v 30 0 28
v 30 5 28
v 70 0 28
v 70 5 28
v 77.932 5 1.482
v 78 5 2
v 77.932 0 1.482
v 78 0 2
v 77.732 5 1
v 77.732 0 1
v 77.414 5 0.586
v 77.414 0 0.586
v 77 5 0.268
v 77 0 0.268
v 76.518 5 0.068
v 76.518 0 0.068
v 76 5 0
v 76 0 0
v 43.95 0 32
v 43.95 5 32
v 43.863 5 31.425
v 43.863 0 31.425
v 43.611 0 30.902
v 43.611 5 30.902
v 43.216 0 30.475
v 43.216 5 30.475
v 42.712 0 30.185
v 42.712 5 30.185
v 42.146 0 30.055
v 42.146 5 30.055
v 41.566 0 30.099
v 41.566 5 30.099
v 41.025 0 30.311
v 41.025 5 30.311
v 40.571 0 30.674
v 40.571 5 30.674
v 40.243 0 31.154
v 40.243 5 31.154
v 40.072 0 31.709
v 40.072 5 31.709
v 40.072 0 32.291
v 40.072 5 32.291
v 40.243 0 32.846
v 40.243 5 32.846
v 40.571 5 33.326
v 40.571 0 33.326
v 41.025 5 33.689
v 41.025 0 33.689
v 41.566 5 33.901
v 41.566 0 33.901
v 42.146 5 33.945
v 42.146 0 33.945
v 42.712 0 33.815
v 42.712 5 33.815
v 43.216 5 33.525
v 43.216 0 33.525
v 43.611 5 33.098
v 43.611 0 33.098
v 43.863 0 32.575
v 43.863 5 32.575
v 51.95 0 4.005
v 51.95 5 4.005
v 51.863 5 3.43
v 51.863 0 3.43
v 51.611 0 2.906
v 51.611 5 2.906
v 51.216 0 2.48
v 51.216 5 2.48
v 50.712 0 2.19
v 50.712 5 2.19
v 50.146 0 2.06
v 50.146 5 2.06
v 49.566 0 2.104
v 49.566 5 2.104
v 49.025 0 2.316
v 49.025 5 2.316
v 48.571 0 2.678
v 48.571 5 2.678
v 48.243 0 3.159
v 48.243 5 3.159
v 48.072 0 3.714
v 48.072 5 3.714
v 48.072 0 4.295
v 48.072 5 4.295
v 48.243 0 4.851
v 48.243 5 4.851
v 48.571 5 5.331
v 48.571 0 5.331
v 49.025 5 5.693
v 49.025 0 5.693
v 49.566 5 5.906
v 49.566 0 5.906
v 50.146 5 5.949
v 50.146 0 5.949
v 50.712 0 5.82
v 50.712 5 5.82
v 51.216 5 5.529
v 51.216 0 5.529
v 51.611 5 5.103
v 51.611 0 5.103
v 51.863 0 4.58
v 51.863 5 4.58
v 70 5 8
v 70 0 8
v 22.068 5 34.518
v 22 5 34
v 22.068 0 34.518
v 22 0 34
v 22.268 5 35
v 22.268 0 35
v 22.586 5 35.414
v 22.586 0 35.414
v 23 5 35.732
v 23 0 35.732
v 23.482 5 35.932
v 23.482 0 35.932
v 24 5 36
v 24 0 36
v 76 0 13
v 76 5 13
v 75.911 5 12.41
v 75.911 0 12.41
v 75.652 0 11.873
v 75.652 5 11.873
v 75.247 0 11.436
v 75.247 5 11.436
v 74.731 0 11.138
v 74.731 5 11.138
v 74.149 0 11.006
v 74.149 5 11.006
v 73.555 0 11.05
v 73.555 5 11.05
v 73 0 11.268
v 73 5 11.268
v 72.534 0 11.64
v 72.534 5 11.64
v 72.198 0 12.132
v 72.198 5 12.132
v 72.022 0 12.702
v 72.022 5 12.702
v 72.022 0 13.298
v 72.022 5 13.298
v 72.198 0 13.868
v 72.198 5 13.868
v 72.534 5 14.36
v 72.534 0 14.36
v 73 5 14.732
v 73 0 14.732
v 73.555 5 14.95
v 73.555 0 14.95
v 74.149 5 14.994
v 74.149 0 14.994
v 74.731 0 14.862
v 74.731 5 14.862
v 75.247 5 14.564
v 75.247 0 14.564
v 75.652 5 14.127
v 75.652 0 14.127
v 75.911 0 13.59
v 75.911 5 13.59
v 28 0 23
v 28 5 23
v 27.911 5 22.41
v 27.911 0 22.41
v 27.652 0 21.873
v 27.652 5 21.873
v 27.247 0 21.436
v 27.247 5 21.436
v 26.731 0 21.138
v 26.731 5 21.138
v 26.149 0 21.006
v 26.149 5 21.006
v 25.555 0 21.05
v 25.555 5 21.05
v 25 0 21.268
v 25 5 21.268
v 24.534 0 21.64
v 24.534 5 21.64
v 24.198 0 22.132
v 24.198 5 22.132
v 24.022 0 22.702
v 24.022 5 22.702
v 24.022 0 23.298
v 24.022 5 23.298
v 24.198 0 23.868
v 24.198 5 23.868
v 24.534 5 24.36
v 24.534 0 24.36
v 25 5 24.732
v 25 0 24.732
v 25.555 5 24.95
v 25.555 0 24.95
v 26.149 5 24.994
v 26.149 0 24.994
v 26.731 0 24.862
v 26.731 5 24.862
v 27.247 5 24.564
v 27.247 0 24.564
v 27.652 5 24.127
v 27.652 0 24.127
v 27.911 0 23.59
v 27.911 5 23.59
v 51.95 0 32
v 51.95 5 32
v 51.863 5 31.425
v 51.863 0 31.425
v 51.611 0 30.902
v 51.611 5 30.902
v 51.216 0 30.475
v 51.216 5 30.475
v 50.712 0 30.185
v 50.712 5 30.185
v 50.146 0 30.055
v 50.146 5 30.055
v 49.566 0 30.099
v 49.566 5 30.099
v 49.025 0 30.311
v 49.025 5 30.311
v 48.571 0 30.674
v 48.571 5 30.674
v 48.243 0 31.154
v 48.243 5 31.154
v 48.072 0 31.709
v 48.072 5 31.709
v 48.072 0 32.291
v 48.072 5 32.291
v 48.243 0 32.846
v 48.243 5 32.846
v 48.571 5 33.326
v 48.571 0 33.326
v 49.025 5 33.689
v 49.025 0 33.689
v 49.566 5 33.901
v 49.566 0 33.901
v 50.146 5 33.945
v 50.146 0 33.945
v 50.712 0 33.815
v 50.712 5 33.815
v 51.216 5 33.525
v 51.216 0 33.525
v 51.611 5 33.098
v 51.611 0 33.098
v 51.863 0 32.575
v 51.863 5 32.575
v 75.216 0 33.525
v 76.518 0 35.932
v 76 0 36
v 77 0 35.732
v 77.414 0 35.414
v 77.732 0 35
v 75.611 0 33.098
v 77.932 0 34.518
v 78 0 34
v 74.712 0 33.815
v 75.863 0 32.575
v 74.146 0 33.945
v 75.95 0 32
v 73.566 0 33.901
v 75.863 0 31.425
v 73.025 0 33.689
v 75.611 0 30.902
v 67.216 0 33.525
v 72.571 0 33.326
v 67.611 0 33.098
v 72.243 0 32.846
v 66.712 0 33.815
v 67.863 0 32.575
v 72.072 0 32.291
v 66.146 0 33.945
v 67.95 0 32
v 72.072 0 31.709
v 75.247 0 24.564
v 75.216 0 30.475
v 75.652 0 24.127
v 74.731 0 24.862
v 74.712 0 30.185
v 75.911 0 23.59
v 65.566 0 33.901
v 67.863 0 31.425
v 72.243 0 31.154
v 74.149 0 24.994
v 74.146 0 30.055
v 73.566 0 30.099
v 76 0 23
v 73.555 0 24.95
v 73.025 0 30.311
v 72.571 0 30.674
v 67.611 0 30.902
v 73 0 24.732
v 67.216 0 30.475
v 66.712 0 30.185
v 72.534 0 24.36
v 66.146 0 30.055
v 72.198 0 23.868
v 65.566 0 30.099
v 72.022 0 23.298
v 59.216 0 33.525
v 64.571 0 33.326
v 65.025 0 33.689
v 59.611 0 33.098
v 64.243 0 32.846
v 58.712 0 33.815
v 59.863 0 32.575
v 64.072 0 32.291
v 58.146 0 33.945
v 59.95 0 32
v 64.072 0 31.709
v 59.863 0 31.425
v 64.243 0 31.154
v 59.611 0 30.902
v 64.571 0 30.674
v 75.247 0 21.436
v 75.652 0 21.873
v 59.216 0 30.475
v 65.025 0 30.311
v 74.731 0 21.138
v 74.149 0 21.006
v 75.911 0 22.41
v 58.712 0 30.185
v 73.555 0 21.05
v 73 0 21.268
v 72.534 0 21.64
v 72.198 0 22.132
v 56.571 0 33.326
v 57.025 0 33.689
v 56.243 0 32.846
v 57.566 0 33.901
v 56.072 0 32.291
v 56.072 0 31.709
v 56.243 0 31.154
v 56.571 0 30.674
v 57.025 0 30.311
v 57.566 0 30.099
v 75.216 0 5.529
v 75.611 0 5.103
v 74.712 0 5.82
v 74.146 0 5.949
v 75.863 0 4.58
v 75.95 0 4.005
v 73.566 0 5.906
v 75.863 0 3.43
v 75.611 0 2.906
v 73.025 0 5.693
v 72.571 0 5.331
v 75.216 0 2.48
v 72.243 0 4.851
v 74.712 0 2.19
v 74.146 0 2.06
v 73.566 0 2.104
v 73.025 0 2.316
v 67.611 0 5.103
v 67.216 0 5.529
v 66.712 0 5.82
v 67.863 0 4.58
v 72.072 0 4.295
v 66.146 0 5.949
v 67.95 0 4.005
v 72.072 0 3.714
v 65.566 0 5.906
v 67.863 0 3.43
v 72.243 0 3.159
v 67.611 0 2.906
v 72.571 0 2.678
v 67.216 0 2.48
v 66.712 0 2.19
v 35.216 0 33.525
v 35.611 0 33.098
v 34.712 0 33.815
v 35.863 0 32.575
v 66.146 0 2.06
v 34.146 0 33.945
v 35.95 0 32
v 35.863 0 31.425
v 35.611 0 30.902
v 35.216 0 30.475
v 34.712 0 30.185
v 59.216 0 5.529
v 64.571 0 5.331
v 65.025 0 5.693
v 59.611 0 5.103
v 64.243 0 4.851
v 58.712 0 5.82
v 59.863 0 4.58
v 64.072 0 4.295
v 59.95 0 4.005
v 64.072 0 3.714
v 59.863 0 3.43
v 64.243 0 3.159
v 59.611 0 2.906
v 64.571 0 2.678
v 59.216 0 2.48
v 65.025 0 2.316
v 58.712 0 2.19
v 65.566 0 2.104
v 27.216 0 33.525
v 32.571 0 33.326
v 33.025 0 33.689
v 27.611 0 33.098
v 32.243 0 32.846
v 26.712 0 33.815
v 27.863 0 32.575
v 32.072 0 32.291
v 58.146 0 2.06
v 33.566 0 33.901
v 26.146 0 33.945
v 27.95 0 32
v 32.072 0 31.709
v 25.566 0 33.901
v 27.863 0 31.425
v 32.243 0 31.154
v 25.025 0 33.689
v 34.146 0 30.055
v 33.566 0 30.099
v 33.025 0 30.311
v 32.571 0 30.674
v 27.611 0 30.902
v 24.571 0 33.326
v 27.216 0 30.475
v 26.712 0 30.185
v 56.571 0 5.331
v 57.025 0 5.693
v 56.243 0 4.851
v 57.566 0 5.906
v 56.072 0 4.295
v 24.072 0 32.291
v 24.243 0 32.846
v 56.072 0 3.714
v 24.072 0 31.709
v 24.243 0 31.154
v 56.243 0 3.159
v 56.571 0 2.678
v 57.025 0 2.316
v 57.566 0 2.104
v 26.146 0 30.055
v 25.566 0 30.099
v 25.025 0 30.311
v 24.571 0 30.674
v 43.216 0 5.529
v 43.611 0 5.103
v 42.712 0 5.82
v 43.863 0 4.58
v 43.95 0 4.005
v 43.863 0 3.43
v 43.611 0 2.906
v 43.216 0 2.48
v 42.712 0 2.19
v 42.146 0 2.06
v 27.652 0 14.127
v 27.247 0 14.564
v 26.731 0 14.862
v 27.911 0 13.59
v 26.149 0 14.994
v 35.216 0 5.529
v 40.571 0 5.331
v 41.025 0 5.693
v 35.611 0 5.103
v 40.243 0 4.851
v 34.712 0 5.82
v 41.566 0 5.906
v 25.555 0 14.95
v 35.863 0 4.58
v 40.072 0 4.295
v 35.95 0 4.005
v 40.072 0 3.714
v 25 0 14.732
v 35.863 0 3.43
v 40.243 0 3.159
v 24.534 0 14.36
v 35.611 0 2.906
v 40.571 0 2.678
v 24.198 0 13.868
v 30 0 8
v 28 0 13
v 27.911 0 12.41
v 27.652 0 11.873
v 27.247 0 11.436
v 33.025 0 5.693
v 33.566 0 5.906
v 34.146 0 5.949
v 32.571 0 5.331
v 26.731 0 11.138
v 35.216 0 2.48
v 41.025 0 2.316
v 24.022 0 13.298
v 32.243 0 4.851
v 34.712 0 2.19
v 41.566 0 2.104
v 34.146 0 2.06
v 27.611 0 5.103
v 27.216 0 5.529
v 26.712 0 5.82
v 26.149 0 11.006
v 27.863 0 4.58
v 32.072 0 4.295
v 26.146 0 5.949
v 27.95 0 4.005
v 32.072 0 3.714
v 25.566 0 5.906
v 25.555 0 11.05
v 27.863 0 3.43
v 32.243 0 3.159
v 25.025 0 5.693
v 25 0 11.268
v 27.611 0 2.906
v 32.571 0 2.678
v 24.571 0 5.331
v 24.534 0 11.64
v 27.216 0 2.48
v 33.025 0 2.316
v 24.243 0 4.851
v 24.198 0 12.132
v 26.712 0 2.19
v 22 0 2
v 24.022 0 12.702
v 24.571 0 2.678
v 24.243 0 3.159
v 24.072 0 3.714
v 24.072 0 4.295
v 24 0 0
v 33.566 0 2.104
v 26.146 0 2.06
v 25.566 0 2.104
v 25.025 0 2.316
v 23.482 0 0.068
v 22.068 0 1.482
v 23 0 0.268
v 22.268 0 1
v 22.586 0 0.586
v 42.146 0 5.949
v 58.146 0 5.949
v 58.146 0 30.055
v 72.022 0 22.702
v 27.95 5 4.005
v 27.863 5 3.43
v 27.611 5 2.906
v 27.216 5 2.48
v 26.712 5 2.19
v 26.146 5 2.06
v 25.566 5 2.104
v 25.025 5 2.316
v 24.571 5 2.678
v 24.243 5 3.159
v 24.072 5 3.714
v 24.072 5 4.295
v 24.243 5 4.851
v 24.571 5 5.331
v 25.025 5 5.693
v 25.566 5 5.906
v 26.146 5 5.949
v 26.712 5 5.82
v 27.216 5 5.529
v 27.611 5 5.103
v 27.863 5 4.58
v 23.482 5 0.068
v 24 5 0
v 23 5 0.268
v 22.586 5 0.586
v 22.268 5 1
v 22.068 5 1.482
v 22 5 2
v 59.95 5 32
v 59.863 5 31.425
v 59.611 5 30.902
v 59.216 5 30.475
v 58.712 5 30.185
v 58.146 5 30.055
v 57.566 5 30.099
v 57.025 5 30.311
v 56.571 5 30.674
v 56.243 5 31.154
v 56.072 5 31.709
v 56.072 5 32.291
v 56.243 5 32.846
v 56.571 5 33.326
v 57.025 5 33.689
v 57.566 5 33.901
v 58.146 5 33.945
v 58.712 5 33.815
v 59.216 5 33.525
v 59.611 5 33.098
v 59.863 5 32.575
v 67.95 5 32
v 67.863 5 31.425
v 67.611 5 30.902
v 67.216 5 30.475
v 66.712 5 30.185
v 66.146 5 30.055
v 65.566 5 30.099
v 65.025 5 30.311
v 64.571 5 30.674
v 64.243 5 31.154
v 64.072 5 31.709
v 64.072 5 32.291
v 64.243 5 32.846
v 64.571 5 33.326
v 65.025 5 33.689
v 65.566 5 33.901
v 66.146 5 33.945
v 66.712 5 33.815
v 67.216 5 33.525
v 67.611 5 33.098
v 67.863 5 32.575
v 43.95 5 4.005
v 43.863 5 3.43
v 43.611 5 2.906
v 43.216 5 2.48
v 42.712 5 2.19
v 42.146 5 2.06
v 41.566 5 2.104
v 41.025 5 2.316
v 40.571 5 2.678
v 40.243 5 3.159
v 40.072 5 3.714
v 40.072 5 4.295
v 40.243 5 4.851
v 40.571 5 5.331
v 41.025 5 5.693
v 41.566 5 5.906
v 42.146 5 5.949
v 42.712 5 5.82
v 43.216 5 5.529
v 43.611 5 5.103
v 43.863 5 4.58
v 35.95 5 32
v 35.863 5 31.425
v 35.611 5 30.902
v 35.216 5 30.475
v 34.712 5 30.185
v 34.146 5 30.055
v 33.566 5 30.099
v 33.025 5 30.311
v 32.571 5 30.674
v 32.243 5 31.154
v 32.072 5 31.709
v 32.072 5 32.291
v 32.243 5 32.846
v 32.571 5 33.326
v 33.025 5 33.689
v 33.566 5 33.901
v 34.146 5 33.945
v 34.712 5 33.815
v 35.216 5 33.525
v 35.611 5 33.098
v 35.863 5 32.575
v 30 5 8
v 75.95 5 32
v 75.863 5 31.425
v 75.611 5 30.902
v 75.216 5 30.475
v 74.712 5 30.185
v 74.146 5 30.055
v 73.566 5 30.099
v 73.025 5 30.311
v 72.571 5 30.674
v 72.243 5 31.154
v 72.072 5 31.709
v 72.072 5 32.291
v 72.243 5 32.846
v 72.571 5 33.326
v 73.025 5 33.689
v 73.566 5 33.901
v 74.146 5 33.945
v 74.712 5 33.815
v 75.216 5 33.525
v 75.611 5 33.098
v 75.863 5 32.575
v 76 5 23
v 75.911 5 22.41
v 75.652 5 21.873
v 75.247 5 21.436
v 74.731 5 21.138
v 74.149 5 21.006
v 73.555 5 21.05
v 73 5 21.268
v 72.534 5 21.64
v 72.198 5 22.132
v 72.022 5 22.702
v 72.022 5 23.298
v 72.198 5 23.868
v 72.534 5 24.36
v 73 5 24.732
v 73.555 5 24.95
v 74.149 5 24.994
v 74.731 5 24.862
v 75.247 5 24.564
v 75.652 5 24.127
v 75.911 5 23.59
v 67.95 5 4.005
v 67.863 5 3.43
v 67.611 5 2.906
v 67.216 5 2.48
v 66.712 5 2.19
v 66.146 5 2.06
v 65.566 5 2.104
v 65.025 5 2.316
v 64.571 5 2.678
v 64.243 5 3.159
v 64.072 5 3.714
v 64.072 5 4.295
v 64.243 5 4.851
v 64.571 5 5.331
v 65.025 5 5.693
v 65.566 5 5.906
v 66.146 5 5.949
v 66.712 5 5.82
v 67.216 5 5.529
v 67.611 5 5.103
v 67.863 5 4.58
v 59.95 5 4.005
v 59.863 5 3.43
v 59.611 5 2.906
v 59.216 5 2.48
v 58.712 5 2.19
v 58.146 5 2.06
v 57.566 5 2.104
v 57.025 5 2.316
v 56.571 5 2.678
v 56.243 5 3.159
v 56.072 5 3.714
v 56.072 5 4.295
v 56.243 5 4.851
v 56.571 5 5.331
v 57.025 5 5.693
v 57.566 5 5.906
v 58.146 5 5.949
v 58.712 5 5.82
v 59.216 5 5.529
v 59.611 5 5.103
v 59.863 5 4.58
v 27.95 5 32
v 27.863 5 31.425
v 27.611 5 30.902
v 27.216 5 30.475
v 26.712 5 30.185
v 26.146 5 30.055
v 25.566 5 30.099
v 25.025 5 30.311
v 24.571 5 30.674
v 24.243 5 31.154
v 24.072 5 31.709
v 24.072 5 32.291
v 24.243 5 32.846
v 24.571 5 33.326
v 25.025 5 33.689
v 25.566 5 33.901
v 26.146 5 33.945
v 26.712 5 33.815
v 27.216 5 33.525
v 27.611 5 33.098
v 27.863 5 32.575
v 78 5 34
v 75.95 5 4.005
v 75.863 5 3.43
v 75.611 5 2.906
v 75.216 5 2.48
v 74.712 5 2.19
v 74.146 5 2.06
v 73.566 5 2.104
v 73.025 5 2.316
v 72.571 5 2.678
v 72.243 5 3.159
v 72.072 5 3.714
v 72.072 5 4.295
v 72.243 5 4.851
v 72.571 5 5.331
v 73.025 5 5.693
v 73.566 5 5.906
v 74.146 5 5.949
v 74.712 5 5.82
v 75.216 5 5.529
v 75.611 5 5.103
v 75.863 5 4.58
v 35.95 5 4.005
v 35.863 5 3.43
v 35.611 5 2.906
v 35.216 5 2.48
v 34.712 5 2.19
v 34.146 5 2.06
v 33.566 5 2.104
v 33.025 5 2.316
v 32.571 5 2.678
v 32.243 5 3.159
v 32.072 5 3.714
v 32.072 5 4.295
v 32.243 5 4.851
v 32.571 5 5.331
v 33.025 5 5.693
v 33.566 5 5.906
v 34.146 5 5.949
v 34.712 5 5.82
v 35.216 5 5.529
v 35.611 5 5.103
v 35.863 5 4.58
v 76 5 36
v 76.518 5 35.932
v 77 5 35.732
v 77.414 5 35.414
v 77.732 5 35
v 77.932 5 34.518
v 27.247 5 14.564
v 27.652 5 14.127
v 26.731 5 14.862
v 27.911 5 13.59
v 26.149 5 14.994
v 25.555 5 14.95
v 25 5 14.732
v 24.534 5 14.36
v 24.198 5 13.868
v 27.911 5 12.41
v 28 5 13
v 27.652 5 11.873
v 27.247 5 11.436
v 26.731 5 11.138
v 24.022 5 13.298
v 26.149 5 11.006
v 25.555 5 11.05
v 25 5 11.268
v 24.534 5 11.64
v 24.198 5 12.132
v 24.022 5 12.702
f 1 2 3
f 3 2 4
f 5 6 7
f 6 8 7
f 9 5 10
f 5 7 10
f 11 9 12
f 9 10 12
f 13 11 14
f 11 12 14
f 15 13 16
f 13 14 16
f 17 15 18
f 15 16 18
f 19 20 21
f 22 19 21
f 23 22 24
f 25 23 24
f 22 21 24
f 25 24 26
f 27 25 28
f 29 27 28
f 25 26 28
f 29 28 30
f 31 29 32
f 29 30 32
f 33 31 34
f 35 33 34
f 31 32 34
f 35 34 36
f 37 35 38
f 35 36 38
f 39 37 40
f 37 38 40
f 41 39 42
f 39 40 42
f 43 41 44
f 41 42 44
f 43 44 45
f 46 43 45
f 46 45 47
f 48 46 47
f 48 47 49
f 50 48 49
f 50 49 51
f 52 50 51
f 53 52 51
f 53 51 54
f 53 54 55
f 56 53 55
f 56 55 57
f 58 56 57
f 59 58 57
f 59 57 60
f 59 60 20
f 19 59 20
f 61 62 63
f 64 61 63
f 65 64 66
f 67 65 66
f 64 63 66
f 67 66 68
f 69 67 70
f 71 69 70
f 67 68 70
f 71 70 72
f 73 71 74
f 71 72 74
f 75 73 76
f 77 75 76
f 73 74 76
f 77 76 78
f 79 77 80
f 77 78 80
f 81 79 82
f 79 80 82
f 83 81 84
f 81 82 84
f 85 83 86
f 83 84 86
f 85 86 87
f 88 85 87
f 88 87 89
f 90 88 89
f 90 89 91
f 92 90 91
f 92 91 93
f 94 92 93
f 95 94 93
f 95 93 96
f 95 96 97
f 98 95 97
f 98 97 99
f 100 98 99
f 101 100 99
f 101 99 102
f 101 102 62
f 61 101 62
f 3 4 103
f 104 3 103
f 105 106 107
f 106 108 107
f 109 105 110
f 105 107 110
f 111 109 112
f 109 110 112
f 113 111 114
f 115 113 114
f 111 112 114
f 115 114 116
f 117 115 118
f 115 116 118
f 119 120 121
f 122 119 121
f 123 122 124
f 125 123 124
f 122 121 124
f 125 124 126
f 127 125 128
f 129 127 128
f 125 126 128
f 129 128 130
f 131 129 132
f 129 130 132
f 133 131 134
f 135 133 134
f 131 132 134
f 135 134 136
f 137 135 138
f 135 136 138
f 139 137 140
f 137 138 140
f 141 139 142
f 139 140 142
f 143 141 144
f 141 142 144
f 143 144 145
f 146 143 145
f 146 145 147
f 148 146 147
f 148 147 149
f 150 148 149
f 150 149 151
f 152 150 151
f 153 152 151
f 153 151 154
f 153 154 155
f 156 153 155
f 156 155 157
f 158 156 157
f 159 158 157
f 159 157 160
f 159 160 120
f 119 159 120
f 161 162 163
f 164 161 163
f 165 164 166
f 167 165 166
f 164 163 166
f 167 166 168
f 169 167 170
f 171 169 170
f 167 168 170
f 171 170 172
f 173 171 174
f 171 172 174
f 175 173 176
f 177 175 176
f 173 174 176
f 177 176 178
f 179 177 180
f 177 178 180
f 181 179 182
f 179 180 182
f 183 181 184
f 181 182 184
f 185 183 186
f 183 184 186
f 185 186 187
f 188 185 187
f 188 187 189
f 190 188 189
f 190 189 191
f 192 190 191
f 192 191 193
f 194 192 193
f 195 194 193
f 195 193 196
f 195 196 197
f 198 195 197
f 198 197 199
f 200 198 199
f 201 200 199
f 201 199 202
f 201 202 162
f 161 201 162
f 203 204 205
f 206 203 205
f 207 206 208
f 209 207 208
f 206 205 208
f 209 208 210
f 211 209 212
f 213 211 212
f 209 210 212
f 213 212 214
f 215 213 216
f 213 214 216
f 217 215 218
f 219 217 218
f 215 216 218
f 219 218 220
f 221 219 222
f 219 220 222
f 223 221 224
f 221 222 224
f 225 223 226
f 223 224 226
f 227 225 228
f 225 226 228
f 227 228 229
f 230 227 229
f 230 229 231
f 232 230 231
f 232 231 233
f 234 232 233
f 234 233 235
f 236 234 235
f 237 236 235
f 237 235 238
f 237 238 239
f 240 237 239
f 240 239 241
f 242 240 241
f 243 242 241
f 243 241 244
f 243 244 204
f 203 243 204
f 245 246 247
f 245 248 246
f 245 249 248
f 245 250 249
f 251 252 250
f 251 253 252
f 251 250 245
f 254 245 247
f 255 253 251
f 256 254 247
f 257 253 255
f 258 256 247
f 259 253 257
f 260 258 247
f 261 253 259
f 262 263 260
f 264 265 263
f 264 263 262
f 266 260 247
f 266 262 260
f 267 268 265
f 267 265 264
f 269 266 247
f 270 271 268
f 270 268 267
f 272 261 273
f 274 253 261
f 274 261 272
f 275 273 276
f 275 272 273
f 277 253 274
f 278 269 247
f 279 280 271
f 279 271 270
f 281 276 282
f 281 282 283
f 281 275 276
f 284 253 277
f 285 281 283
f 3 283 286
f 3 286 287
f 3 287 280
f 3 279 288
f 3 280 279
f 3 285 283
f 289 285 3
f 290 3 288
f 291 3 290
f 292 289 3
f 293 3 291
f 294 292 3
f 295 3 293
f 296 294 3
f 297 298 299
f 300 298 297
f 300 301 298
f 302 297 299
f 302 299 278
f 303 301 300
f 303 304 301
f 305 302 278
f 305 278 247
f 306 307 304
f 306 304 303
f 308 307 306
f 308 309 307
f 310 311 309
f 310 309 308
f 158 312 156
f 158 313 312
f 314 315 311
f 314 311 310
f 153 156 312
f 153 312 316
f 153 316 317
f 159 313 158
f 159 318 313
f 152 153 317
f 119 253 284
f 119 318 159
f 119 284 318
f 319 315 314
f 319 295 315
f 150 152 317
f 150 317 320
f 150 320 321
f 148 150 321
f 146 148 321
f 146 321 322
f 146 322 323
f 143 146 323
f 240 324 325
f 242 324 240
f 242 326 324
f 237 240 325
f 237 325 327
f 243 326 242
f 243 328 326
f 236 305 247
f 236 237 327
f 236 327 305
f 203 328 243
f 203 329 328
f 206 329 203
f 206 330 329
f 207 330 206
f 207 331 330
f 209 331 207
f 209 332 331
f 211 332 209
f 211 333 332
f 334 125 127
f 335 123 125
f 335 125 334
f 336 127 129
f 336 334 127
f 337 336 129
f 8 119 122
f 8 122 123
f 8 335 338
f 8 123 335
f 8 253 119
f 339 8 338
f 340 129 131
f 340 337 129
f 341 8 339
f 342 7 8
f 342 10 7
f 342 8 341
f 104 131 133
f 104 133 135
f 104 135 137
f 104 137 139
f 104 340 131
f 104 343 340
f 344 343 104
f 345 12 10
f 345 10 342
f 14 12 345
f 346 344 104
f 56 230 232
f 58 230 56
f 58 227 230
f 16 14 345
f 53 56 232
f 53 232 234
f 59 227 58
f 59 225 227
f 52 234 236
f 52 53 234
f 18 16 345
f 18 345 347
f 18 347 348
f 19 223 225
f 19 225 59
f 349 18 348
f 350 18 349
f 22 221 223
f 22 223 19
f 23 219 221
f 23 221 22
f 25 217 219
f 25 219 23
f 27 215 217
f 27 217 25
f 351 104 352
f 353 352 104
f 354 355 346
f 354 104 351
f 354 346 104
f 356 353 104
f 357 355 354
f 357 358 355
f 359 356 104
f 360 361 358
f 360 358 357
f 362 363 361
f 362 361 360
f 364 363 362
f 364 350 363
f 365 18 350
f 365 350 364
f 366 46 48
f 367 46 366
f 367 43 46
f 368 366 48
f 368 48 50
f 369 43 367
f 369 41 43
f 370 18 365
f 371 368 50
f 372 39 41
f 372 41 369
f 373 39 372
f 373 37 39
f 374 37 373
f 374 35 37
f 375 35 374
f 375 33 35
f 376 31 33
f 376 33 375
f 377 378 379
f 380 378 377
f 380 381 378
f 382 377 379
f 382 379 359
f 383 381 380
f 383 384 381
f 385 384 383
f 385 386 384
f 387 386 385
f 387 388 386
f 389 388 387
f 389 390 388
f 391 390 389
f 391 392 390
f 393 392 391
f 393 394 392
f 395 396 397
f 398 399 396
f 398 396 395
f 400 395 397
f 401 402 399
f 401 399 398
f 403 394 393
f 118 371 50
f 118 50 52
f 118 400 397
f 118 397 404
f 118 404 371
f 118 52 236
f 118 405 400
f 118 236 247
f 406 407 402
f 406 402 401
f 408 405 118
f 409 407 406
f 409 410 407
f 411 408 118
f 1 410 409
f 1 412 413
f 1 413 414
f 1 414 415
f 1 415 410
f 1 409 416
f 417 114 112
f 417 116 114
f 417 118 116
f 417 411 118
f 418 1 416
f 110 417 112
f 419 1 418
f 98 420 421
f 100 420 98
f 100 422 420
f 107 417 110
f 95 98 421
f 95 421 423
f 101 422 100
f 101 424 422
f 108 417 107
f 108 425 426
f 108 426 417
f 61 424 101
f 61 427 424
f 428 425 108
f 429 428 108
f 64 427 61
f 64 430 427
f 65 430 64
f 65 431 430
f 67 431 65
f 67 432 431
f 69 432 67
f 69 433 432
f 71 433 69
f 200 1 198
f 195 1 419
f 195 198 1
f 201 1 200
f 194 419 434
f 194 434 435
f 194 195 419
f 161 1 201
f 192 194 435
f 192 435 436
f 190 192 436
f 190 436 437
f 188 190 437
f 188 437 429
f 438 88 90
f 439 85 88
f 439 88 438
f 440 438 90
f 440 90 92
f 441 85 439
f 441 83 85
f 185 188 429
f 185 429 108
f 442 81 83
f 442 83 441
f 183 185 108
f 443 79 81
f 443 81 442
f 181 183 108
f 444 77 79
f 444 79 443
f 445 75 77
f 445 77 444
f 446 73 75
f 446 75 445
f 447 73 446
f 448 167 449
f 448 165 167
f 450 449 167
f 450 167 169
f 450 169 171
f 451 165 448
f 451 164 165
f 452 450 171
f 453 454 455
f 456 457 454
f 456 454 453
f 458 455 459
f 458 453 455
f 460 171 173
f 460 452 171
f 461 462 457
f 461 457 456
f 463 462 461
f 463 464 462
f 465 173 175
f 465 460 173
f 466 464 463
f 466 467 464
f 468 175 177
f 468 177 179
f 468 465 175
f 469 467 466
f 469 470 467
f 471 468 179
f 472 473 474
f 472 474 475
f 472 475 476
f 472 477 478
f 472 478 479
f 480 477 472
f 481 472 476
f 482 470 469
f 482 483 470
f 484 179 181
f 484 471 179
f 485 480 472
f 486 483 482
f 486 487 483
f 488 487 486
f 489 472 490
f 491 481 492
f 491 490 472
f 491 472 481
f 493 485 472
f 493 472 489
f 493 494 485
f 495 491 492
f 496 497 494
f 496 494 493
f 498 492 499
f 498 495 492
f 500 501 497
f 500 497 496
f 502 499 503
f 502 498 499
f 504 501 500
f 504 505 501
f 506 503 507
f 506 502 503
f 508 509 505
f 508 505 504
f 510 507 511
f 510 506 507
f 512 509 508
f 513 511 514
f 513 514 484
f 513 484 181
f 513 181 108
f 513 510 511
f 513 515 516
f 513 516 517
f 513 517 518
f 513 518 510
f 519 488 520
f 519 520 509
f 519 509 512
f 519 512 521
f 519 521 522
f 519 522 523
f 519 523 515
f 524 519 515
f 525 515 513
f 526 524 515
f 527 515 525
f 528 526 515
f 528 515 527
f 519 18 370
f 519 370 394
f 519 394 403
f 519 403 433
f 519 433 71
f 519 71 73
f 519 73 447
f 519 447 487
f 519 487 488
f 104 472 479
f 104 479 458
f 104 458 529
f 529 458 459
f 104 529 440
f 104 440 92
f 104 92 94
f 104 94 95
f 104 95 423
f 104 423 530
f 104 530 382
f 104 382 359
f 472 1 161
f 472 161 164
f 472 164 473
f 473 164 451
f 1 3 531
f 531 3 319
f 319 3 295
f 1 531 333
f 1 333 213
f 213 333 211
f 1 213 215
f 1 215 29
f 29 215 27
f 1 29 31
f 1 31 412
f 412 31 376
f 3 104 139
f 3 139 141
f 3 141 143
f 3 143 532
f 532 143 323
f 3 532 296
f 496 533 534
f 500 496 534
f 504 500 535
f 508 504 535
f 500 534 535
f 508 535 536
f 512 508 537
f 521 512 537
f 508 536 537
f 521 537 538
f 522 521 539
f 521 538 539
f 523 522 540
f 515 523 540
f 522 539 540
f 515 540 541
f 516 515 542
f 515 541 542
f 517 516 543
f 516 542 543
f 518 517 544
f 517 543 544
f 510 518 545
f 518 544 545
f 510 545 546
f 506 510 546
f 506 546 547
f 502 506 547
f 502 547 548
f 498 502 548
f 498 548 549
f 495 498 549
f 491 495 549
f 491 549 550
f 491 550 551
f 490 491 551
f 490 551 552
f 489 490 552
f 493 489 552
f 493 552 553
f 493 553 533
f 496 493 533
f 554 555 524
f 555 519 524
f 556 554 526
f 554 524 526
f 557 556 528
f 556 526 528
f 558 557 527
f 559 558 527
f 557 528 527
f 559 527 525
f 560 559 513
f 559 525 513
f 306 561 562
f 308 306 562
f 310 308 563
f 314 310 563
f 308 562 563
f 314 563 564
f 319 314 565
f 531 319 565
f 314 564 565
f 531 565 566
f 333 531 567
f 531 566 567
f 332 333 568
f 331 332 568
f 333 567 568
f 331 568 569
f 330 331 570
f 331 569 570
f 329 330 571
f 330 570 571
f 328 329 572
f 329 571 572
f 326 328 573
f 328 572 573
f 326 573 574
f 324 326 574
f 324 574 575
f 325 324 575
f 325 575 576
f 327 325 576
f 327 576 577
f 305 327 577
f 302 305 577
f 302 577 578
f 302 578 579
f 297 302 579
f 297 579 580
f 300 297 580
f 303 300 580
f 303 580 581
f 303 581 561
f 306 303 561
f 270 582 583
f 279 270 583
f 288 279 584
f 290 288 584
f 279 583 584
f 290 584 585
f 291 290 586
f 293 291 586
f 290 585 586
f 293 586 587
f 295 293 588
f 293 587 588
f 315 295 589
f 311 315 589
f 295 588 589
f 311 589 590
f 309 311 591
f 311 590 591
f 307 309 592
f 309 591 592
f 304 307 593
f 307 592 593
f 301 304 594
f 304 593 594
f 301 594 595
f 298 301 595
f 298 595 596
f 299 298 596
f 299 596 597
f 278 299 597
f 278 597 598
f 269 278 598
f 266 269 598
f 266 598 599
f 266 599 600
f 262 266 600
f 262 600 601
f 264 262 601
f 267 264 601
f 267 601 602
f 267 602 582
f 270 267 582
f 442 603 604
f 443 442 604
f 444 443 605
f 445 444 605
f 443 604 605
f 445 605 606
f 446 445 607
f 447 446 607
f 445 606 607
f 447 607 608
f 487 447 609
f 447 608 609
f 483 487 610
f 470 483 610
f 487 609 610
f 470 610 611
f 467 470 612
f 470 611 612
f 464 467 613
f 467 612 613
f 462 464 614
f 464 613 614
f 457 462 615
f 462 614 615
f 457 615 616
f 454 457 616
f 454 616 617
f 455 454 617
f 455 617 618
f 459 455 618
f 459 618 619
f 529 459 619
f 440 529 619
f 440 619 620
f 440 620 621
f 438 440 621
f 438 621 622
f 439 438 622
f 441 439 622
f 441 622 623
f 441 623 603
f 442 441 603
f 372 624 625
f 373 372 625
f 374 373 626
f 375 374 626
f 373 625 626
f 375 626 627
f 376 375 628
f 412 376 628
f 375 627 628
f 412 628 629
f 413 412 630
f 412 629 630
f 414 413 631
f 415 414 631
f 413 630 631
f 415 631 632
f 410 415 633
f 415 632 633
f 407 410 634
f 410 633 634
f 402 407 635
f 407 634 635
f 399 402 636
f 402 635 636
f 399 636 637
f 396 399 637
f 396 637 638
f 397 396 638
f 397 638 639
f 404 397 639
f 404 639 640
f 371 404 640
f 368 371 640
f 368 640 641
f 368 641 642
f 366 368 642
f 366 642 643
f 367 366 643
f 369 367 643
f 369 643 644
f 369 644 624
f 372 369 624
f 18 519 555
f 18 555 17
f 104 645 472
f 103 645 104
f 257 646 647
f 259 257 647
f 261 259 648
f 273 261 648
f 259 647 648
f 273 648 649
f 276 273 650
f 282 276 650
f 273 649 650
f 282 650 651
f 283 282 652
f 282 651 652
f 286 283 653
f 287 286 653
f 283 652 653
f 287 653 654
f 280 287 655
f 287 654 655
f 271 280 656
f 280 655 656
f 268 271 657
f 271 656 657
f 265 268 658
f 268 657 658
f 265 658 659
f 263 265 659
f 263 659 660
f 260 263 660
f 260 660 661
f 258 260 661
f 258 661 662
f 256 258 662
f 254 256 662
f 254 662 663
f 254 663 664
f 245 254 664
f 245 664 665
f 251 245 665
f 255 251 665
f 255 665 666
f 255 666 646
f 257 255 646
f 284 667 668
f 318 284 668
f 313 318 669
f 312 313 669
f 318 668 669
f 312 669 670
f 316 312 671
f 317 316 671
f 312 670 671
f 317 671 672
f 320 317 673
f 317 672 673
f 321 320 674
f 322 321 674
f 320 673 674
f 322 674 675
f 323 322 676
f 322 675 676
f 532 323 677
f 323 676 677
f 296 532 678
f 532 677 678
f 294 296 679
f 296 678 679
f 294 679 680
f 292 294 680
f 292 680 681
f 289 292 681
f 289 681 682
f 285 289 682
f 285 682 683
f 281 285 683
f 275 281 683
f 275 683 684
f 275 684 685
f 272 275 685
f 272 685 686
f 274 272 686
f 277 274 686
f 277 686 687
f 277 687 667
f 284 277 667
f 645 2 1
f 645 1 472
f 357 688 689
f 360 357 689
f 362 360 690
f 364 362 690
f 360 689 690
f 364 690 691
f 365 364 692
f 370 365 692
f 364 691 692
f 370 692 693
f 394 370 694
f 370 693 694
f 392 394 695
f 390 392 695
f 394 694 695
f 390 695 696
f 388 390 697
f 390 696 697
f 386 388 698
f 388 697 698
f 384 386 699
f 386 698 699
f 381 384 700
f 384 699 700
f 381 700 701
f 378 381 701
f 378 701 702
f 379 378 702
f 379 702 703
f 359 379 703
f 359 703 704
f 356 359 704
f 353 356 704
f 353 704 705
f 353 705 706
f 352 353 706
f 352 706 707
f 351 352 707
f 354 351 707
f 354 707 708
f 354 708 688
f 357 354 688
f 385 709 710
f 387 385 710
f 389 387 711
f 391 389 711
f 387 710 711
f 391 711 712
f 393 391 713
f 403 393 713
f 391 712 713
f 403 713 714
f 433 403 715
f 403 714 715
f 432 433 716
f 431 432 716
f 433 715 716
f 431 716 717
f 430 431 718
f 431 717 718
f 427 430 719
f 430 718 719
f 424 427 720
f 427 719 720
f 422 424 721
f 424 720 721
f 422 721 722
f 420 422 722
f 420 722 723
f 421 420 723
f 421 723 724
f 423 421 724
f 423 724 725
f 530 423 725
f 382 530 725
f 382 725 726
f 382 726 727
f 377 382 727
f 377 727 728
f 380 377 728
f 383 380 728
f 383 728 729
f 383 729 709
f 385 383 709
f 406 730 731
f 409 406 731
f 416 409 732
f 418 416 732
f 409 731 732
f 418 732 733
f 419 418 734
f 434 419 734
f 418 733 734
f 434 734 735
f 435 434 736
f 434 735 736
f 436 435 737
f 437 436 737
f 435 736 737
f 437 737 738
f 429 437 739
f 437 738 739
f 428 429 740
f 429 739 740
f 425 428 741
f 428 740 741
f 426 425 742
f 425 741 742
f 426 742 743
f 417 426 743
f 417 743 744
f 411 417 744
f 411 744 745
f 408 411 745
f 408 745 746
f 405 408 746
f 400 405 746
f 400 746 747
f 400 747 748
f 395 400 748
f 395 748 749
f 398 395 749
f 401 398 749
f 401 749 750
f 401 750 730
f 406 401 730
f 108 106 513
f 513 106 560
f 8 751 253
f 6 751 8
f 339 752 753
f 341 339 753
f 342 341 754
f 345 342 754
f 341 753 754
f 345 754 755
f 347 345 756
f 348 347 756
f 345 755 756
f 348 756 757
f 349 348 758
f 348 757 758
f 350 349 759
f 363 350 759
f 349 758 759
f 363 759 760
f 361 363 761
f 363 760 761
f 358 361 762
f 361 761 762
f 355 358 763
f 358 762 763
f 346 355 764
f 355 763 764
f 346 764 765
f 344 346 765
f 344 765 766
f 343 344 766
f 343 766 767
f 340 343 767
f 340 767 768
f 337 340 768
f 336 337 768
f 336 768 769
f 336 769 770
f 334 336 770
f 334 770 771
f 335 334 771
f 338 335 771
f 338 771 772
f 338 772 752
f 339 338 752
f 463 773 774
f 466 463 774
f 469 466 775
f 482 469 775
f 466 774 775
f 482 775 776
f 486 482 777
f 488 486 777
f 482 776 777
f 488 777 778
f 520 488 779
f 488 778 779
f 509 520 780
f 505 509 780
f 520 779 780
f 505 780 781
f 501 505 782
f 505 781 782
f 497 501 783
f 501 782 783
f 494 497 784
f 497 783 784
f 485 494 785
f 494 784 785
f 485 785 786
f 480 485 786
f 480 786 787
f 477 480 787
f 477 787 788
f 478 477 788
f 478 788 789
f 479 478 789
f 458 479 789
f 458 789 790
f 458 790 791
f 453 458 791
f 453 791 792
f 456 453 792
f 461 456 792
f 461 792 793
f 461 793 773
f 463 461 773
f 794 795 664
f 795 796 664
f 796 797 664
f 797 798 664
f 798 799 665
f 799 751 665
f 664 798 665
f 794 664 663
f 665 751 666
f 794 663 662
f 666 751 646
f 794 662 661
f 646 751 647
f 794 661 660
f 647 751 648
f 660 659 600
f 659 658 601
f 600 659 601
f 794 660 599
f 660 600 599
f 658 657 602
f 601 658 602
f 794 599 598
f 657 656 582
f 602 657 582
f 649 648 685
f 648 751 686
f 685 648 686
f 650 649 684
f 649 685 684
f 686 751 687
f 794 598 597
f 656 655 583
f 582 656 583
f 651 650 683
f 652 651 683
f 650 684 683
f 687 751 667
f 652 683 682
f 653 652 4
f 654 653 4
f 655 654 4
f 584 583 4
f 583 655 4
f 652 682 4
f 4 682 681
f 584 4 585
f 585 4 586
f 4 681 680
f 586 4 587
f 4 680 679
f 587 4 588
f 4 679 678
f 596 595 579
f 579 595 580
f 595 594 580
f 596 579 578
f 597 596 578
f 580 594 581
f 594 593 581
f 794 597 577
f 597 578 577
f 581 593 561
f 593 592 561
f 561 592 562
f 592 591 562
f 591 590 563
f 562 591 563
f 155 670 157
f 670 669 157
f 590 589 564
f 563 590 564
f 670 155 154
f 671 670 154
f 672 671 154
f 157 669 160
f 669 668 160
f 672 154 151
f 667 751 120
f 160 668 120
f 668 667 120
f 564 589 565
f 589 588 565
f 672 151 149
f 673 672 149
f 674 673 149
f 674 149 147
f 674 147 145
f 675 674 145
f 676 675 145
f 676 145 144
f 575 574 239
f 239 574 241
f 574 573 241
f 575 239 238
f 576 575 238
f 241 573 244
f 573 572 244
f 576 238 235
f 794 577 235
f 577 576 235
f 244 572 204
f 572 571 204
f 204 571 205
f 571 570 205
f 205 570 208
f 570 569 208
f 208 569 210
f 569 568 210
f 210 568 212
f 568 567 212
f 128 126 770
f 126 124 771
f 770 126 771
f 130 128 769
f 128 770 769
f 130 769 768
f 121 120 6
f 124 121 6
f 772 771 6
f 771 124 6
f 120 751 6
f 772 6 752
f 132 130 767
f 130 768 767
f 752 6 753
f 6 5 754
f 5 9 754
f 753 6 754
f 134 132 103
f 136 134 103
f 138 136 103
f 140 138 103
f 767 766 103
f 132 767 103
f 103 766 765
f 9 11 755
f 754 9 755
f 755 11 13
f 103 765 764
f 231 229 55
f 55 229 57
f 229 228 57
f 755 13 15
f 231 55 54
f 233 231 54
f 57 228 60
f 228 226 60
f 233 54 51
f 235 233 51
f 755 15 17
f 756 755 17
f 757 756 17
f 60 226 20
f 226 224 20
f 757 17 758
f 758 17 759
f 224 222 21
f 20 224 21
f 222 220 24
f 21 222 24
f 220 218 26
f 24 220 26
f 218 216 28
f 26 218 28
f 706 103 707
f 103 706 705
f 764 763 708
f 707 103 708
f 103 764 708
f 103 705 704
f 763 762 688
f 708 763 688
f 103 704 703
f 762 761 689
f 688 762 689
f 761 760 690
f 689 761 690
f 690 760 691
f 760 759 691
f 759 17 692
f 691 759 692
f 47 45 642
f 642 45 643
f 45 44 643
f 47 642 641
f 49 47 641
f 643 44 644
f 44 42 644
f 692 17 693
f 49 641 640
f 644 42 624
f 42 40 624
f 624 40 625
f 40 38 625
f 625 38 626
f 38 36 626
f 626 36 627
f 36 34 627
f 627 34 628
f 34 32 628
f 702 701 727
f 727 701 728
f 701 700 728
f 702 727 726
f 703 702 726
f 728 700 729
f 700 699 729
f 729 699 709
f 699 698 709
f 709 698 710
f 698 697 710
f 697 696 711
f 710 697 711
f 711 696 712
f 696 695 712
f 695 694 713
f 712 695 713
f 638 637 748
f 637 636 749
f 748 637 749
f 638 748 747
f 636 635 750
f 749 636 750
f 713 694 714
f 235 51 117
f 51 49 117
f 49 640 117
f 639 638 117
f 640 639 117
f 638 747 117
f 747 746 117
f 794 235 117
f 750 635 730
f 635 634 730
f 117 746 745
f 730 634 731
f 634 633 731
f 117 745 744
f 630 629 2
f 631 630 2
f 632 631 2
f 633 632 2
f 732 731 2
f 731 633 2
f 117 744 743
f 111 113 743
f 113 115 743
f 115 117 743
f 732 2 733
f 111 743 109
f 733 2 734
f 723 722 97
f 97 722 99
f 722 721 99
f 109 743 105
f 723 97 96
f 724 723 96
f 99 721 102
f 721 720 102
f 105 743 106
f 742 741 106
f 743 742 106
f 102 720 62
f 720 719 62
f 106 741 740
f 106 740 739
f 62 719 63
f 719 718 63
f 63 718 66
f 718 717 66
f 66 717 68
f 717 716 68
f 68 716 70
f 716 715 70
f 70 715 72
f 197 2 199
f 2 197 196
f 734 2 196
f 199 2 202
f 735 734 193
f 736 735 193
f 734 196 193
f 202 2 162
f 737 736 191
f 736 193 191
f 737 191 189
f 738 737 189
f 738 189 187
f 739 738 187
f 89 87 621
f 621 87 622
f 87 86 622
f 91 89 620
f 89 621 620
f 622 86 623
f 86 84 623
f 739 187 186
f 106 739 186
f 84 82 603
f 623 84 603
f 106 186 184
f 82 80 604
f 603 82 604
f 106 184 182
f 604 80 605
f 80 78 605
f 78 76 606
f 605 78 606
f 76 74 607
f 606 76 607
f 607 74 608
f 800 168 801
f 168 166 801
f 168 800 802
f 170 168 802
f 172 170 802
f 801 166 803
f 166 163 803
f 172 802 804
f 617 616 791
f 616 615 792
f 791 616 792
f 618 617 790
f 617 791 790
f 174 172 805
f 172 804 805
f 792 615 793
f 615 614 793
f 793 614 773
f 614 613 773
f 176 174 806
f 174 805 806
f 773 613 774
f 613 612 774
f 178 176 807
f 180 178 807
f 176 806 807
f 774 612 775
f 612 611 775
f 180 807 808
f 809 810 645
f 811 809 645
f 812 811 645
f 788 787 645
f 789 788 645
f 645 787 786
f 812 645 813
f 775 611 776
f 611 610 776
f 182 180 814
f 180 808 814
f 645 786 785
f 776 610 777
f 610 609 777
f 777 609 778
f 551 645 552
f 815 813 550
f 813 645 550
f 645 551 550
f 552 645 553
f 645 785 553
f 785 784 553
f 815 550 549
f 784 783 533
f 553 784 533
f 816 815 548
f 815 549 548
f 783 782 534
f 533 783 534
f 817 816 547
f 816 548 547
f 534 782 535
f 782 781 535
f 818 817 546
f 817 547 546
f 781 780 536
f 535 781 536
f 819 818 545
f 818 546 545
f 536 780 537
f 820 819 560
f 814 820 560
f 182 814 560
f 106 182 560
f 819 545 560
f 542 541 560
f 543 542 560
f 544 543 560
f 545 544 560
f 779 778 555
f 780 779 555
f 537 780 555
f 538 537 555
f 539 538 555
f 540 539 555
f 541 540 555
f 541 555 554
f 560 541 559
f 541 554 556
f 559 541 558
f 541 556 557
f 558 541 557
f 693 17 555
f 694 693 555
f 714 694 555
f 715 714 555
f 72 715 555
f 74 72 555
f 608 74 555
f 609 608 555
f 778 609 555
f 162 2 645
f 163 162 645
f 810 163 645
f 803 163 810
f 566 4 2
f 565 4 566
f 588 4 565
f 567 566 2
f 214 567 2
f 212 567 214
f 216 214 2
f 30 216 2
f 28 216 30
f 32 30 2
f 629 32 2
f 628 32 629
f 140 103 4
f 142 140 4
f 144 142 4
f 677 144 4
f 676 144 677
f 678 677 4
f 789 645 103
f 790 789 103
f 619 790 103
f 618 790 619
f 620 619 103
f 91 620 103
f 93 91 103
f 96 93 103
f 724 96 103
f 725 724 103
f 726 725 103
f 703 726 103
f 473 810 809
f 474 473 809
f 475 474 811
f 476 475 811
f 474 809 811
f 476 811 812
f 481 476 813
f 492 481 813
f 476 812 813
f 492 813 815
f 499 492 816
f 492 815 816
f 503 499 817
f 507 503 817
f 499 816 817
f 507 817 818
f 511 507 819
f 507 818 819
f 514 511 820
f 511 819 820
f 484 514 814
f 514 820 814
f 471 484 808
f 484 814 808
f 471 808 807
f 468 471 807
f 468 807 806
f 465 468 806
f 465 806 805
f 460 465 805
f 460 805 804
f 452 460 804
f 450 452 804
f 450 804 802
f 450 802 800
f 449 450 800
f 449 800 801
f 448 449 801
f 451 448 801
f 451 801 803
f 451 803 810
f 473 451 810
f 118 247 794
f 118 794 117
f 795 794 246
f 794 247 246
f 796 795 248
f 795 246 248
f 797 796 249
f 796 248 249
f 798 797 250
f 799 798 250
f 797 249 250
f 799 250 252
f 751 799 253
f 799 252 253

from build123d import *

# Parameters (mm, degrees)
BOSS_EXTRUDE1_DEPTH = 5
SKETCH2_R           = 1.95
SKETCH2_W           = 40
SKETCH2_H           = 20
CUT_EXTRUDE1_DEPTH  = 6
SKETCH4_W           = 22
SKETCH4_H           = 36
CUT_EXTRUDE2_DEPTH  = 10
FILLET1_R           = 2
FILLET2_R           = 2
FILLET3_R           = 2
FILLET4_R           = 2
SKETCH5_R           = 2
CUT_EXTRUDE3_DEPTH  = 6


with BuildPart() as part:
    # Sketch1 → Boss-Extrude1 (new body)
    with BuildSketch(Plane(origin=(0, 0, 0), x_dir=(1, 0, 0), z_dir=(0, 1, 0))):
        with BuildLine():
            Line((2, 0), (98, 0))
            ThreePointArc((98, 0), (99.414213562, -0.585786438), (100, -2))
            Line((100, -2), (100, -34))
            ThreePointArc((100, -34), (99.414213562, -35.414213562), (98, -36))
            Line((98, -36), (2, -36))
            ThreePointArc((2, -36), (0.585786438, -35.414213562), (0, -34))
            Line((0, -34), (0, -2))
            ThreePointArc((0, -2), (0.585786438, -0.585786438), (2, 0))
        make_face()
    extrude(amount=BOSS_EXTRUDE1_DEPTH)

    # Sketch2 → Cut-Extrude1 (cut, through all)
    with BuildSketch(Plane(origin=(0, 5, 0), x_dir=(1, 0, 0), z_dir=(0, 1, 0))):
        with Locations((90, -4.00475022)):
            Circle(SKETCH2_R)
        with Locations((82, -4.00475022)):
            Circle(SKETCH2_R)
        with Locations((18, -4.00475022)):
            Circle(SKETCH2_R)
        with Locations((26, -4.00475022)):
            Circle(SKETCH2_R)
        with Locations((34, -4.00475022)):
            Circle(SKETCH2_R)
        with Locations((42, -4.00475022)):
            Circle(SKETCH2_R)
        with Locations((50, -4.00475022)):
            Circle(SKETCH2_R)
        with Locations((58, -4.00475022)):
            Circle(SKETCH2_R)
        with Locations((66, -4.00475022)):
            Circle(SKETCH2_R)
        with Locations((74, -4.00475022)):
            Circle(SKETCH2_R)
        with Locations((90, -32)):
            Circle(SKETCH2_R)
        with Locations((82, -32)):
            Circle(SKETCH2_R)
        with Locations((18, -32)):
            Circle(SKETCH2_R)
        with Locations((26, -32)):
            Circle(SKETCH2_R)
        with Locations((34, -32)):
            Circle(SKETCH2_R)
        with Locations((42, -32)):
            Circle(SKETCH2_R)
        with Locations((50, -32)):
            Circle(SKETCH2_R)
        with Locations((58, -32)):
            Circle(SKETCH2_R)
        with Locations((66, -32)):
            Circle(SKETCH2_R)
        with Locations((74, -32)):
            Circle(SKETCH2_R)
        with Locations((50, -18)):
            Rectangle(SKETCH2_W, SKETCH2_H)
    extrude(amount=-CUT_EXTRUDE1_DEPTH, mode=Mode.SUBTRACT)

    # Sketch4 → Cut-Extrude2 (cut)
    with BuildSketch(Plane(origin=(0, 5, 0), x_dir=(1, 0, 0), z_dir=(0, 1, 0))):
        with Locations((89, -18)):
            Rectangle(SKETCH4_W, SKETCH4_H)
        with Locations((11, -18)):
            Rectangle(SKETCH4_W, SKETCH4_H)
    extrude(amount=-CUT_EXTRUDE2_DEPTH, mode=Mode.SUBTRACT)

    # Fillet1
    fillet1_edges = [part.edges().sort_by_distance(p)[0] for p in [
        (22, 2.5, 0),
    ]]
    fillet(fillet1_edges, radius=FILLET1_R)

    # Fillet2
    fillet2_edges = [part.edges().sort_by_distance(p)[0] for p in [
        (22, 2.5, 36),
    ]]
    fillet(fillet2_edges, radius=FILLET2_R)

    # Fillet3
    fillet3_edges = [part.edges().sort_by_distance(p)[0] for p in [
        (78, 2.5, 36),
    ]]
    fillet(fillet3_edges, radius=FILLET3_R)

    # Fillet4
    fillet4_edges = [part.edges().sort_by_distance(p)[0] for p in [
        (78, 2.5, 0),
    ]]
    fillet(fillet4_edges, radius=FILLET4_R)

    # Sketch5 → Cut-Extrude3 (cut, through all)
    with BuildSketch(Plane(origin=(0, 5, 0), x_dir=(1, 0, 0), z_dir=(0, 1, 0))):
        with Locations((74, -13)):
            Circle(SKETCH5_R)
        with Locations((74, -23)):
            Circle(SKETCH5_R)
        with Locations((26, -13)):
            Circle(SKETCH5_R)
        with Locations((26, -23)):
            Circle(SKETCH5_R)
    extrude(amount=-CUT_EXTRUDE3_DEPTH, mode=Mode.SUBTRACT)


solid = part.part
